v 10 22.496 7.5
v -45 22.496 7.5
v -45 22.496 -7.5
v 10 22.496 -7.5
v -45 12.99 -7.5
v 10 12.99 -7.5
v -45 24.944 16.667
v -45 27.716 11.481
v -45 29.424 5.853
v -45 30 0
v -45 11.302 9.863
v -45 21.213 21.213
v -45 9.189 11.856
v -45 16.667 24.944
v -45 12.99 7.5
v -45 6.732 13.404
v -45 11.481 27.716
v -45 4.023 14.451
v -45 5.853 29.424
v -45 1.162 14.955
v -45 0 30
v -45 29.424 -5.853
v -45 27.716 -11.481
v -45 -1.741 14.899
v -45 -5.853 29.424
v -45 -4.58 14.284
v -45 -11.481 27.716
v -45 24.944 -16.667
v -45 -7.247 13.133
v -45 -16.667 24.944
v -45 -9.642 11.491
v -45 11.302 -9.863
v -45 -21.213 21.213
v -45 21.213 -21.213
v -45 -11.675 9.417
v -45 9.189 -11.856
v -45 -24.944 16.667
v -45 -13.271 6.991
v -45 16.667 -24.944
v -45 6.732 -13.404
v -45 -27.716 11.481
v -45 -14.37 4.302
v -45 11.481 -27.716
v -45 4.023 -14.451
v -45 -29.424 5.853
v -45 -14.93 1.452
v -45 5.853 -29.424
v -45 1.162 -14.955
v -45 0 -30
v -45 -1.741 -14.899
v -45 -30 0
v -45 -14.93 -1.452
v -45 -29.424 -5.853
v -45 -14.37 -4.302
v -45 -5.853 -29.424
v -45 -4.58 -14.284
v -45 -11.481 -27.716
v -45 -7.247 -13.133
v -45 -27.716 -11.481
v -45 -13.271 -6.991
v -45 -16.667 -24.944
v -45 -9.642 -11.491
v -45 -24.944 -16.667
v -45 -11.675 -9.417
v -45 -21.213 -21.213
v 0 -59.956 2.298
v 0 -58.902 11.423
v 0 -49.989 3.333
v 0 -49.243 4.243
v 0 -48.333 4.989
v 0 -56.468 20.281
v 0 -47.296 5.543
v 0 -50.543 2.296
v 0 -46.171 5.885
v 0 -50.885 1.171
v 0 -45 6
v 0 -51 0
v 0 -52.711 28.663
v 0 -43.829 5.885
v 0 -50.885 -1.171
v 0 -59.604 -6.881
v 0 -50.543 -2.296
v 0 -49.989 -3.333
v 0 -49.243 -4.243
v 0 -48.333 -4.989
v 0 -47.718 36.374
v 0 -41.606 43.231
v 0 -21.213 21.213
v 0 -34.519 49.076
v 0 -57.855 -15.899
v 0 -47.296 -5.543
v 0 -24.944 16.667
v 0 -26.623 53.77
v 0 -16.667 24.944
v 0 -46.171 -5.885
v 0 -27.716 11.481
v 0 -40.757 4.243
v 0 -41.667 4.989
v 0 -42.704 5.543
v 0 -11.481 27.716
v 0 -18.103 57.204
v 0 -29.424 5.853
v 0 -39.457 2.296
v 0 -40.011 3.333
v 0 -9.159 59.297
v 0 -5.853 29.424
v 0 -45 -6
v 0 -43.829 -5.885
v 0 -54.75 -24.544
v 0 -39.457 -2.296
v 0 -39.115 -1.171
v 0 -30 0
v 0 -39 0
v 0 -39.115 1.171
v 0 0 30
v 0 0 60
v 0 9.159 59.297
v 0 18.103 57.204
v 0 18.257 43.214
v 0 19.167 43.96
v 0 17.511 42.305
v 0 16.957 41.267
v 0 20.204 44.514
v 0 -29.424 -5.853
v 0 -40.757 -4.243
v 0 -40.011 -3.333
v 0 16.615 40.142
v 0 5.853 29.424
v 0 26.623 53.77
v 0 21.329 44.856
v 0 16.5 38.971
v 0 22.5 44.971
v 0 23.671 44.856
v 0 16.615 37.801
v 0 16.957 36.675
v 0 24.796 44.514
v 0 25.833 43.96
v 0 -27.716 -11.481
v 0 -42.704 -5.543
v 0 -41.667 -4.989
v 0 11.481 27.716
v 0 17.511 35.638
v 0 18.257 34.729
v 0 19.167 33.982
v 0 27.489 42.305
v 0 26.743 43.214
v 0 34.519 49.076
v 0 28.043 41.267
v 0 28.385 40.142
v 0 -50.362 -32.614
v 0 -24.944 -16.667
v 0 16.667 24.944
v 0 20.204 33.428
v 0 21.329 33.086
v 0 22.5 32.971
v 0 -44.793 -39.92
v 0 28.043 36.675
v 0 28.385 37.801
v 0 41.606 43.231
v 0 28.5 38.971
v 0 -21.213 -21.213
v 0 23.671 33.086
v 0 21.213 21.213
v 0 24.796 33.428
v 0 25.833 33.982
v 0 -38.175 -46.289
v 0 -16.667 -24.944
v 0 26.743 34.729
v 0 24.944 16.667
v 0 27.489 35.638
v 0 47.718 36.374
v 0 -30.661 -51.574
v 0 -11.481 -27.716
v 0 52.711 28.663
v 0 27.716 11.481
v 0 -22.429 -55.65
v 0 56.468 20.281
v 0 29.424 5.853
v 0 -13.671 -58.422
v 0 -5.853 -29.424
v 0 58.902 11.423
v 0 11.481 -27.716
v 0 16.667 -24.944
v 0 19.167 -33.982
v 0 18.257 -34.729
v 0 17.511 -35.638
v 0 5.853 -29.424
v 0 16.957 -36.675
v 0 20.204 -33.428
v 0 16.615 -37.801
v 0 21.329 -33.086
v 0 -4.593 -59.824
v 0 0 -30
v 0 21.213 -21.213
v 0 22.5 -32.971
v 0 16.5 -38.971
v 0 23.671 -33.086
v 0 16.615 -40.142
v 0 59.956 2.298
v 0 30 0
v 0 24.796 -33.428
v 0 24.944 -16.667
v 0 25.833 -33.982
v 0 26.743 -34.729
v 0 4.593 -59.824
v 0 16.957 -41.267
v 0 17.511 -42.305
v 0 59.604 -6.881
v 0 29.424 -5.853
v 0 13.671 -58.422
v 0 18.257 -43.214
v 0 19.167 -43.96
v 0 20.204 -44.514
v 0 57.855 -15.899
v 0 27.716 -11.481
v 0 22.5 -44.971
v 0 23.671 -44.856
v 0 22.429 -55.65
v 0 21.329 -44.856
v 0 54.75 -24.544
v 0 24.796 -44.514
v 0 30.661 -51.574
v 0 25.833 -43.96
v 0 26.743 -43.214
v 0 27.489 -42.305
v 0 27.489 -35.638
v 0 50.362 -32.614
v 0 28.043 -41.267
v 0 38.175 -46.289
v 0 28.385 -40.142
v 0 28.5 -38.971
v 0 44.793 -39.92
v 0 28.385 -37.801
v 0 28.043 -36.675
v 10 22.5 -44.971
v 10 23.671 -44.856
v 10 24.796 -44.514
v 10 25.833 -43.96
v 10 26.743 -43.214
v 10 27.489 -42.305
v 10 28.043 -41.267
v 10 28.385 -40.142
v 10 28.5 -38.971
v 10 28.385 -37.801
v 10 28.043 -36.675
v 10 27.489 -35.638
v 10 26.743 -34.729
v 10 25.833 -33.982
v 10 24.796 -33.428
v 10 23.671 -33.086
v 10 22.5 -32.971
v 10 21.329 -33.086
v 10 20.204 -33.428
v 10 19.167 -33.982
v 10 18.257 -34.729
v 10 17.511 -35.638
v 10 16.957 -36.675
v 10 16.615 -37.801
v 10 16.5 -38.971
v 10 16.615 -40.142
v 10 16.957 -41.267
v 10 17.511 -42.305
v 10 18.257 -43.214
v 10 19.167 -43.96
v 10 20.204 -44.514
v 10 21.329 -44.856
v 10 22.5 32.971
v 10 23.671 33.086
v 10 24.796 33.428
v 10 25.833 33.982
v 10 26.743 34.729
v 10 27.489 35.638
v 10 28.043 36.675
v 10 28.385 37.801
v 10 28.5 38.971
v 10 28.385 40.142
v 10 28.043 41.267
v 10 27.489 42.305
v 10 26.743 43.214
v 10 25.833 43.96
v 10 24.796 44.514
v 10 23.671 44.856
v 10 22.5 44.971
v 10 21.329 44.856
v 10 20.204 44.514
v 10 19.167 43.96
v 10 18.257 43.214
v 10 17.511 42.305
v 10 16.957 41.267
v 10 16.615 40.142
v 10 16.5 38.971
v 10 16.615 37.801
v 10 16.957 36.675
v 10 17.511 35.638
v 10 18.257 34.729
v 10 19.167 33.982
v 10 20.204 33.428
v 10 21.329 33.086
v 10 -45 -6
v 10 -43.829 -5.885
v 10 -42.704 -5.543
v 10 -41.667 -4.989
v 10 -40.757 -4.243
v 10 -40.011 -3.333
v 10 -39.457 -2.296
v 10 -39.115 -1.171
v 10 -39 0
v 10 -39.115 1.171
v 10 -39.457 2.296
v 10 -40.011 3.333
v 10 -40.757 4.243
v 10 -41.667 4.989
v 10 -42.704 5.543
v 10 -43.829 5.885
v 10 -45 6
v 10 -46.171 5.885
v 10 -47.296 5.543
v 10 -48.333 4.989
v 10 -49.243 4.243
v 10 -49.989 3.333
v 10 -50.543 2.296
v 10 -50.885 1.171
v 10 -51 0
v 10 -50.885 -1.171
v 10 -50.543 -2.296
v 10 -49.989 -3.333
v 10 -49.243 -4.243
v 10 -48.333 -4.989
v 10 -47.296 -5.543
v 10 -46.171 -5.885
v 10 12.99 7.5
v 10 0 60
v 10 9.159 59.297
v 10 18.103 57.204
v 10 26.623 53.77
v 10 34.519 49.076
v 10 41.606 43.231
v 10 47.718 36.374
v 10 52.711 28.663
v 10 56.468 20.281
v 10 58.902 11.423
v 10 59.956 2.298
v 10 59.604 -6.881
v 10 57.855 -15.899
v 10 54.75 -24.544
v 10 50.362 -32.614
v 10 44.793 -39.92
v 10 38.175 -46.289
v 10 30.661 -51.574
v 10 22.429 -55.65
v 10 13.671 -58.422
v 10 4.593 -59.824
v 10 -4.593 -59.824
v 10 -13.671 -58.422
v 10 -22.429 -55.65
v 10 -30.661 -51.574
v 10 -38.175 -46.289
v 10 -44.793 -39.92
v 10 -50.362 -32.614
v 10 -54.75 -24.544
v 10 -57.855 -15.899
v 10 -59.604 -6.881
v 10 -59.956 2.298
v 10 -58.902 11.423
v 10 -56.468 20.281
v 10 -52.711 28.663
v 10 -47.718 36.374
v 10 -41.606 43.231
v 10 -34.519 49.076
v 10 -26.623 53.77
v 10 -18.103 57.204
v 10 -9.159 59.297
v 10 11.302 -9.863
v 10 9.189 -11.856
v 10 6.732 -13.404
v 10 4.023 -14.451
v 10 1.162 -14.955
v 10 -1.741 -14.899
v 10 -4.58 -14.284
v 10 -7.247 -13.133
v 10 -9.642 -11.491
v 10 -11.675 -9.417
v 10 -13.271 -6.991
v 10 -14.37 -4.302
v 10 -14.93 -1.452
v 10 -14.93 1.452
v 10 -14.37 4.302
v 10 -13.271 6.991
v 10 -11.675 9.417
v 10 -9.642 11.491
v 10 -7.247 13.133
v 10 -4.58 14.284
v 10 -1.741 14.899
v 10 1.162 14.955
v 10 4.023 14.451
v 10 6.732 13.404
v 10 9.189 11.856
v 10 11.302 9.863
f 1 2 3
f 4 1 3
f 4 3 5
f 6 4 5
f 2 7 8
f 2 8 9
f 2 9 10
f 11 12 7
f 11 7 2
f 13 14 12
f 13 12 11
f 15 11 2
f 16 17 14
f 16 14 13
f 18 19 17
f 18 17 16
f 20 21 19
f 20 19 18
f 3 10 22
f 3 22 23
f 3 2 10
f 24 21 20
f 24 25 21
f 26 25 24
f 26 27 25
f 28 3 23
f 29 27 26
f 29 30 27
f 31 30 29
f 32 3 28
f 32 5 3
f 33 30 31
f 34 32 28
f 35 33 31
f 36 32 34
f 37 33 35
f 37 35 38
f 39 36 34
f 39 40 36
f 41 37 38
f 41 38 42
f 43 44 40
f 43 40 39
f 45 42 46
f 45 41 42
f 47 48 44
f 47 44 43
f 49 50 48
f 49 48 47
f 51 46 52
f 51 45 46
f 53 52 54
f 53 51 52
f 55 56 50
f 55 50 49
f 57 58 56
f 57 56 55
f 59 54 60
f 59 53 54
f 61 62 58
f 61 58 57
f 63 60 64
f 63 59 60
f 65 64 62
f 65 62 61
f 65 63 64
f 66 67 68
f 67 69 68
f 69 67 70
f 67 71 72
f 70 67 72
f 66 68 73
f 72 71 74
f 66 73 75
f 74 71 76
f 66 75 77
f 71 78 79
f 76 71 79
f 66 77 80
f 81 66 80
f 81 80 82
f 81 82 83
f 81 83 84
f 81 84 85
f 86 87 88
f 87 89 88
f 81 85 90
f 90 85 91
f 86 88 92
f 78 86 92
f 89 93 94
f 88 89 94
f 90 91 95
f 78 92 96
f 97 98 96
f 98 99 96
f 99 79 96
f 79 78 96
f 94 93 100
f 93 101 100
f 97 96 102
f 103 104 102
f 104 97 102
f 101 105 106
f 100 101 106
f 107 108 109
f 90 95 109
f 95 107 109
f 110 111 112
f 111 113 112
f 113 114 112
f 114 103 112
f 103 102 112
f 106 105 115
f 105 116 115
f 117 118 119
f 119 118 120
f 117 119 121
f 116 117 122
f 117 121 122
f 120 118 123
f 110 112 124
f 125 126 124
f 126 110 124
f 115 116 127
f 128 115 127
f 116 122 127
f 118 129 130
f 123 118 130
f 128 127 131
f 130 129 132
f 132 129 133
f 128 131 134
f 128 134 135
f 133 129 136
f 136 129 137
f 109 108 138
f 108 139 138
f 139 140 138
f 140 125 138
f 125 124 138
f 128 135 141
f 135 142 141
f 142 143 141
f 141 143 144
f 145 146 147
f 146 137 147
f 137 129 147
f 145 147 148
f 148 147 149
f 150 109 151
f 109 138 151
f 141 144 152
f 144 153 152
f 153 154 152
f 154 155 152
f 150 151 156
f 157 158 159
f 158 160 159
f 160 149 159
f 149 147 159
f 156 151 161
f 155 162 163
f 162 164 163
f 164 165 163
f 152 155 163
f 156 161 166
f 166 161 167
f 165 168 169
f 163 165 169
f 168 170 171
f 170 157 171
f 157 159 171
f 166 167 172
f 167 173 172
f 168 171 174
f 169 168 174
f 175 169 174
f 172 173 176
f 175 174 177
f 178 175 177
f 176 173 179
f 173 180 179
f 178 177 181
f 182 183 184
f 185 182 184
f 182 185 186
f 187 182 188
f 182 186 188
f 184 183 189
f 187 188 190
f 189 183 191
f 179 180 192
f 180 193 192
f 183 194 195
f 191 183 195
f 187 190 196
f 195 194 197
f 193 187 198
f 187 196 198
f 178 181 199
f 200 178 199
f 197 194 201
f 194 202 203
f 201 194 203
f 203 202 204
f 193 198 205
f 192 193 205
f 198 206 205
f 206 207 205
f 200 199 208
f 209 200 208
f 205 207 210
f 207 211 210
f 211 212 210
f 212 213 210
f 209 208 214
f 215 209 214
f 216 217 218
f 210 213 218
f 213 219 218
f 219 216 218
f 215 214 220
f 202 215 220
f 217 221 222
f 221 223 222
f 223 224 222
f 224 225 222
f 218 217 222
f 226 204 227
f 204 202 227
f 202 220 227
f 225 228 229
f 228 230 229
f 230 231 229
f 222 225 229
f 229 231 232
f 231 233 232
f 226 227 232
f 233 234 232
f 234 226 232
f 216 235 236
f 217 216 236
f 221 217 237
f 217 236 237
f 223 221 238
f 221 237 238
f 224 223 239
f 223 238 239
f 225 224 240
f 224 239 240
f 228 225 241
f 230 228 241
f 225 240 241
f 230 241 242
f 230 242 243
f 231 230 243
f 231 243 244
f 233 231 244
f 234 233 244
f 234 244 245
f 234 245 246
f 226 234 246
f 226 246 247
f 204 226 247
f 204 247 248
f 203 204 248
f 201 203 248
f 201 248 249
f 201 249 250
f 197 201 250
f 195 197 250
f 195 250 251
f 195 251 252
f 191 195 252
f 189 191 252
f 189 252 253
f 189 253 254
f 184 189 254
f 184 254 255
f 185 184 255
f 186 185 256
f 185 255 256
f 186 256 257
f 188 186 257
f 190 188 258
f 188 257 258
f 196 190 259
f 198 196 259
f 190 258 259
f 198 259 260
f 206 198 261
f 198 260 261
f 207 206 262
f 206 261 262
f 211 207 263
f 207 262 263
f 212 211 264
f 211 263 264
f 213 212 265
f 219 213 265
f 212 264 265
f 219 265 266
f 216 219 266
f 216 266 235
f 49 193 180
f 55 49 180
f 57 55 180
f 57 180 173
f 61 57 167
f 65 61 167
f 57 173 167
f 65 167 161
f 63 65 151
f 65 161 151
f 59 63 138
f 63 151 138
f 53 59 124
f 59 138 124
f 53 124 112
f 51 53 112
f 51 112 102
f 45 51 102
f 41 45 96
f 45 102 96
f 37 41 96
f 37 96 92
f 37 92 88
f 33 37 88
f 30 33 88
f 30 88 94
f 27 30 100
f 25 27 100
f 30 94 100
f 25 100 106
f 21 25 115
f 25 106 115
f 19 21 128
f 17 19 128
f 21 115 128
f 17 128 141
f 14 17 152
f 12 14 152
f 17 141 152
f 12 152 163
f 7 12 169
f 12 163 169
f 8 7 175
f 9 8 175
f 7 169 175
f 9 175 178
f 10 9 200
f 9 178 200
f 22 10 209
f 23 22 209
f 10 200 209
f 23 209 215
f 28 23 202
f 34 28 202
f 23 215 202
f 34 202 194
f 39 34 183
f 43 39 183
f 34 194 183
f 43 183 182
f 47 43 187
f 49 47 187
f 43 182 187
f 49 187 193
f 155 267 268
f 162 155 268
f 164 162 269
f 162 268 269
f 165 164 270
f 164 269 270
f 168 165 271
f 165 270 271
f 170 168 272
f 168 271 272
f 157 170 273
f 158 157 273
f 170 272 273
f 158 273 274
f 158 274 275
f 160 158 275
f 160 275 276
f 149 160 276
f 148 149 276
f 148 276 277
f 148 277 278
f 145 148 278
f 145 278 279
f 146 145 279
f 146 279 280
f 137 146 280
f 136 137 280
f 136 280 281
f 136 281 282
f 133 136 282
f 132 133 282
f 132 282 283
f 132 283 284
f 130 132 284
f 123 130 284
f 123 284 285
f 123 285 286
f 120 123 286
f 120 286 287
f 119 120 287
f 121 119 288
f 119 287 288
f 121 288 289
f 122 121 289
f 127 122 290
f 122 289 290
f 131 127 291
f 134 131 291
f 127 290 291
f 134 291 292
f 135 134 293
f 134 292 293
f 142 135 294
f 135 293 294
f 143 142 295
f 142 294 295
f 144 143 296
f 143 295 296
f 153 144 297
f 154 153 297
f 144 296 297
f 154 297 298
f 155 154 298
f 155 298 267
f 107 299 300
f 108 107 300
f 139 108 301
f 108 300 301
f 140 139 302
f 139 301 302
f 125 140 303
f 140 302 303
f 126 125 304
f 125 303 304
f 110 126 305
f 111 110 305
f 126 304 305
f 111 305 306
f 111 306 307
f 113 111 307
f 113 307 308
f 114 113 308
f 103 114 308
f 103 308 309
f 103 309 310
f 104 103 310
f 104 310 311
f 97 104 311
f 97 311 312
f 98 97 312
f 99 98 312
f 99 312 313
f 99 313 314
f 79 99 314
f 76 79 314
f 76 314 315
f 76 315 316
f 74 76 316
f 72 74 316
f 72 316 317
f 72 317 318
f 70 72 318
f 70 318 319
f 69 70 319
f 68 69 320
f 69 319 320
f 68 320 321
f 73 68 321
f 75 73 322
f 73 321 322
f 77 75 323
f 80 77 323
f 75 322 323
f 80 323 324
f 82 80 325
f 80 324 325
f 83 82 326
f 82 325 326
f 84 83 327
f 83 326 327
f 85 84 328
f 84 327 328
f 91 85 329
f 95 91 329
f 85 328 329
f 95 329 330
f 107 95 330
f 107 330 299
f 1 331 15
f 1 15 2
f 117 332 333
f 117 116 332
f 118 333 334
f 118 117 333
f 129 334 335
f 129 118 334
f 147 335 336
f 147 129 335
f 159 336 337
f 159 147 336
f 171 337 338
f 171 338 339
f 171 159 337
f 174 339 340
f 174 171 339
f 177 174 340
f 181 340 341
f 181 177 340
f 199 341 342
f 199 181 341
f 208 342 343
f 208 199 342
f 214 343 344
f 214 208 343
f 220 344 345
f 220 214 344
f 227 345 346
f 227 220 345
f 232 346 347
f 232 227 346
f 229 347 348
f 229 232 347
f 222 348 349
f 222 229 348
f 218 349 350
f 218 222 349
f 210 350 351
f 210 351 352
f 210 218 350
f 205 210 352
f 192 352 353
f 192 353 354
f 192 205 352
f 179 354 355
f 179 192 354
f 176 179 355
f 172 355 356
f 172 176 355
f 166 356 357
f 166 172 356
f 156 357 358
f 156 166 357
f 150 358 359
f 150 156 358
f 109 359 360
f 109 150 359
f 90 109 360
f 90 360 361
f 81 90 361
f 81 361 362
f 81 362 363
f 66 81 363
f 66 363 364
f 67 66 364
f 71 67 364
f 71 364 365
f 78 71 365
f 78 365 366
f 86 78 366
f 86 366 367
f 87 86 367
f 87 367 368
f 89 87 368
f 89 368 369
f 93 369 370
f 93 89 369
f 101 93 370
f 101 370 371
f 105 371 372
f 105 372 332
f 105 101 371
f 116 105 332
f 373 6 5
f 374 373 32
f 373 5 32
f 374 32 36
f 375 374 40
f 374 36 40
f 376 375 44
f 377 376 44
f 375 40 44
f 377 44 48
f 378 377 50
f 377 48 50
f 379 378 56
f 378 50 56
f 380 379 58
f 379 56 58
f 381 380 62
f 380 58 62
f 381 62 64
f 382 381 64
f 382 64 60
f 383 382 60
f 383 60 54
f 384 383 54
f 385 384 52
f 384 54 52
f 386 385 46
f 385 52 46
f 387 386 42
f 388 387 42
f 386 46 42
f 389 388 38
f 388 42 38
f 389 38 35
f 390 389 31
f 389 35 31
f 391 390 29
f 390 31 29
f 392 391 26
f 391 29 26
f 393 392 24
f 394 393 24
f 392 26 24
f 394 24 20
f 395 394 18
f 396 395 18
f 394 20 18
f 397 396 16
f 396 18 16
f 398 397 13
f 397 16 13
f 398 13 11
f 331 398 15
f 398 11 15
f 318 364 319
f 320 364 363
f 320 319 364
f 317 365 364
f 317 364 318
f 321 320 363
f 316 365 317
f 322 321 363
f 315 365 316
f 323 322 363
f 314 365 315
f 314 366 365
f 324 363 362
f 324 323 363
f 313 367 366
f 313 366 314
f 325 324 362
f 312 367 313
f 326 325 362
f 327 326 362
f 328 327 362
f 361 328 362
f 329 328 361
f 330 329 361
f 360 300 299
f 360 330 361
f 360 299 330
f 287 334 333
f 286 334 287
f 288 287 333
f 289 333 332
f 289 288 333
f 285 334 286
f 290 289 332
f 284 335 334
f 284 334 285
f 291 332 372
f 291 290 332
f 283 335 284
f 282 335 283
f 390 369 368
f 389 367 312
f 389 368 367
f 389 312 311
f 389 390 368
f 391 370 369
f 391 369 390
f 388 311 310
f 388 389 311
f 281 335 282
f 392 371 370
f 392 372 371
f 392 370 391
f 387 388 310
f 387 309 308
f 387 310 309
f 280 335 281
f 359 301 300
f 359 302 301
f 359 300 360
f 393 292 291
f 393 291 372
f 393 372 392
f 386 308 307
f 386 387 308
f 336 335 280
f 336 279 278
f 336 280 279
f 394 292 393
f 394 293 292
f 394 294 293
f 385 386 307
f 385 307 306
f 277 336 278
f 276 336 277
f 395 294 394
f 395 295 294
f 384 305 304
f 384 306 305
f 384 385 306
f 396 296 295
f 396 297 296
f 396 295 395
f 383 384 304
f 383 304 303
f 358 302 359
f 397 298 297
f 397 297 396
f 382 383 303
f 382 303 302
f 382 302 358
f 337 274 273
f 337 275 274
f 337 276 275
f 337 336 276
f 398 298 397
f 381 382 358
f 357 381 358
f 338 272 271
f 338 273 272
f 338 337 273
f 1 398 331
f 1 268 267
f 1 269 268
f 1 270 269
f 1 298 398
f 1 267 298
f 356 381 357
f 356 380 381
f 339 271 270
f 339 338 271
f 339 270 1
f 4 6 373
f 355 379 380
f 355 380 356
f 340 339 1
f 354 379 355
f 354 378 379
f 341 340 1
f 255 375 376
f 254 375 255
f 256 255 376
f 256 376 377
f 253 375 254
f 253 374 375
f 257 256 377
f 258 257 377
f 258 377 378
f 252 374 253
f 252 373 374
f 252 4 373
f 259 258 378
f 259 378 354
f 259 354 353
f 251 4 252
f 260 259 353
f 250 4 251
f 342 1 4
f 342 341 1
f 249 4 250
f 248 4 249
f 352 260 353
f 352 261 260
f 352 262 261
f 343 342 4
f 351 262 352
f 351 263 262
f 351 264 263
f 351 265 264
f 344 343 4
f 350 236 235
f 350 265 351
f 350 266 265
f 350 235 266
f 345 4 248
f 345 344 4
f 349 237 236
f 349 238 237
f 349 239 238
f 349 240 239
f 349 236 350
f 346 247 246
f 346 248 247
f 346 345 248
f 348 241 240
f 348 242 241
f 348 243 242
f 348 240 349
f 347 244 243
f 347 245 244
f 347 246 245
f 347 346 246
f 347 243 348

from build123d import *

# Parameters (mm, degrees)
SKETCH1_W                  = 10
SKETCH1_H                  = 60
SKETCH2_R                  = 30
BOSS_EXTRUDE1_DEPTH        = 45
CUT_EXTRUDE1_DEPTH         = 102.118742081
SKETCH4_W                  = 55
SKETCH4_H                  = 15
F_12_0_12_DIAMETER_HOLE1_D = 12


with BuildPart() as part:
    # Sketch1 → Revolve1 (revolve)
    with BuildSketch(Plane(origin=(0, 0, 0), x_dir=(-1, 0, 0), z_dir=(0, 0, -1)), mode=Mode.PRIVATE) as revolve1_sk:
        with Locations((-5, 30)):
            Rectangle(SKETCH1_W, SKETCH1_H)
    revolve(revolve1_sk.sketch.rotate(Axis((10, 0, 0), (-1, 0, 0)), 270), axis=Axis((10, 0, 0), (-1, 0, 0)))

    # Sketch2 → Boss-Extrude1 (add)
    with BuildSketch(Plane.ZY):
        with Locations(Location((0, 0, 0), (0, 0, 180))):
            Circle(SKETCH2_R)
    extrude(amount=BOSS_EXTRUDE1_DEPTH)

    # Sketch3 → Cut-Extrude1 (cut, through all)
    with BuildSketch(Plane.ZY.offset(45)):
        with BuildLine():
            Line((-7.5, 22.495647676), (-7.5, 12.990381057))
            ThreePointArc((-7.5, 12.990381057), (0, 15), (7.5, 12.990381057))
            Line((7.5, 12.990381057), (7.5, 22.495647676))
            Line((7.5, 22.495647676), (-7.5, 22.495647676))
        make_face()
    extrude(amount=-CUT_EXTRUDE1_DEPTH, mode=Mode.SUBTRACT)

    # Sketch4 → Cut-Revolve1 (revolve, cut)
    with BuildSketch(Plane(origin=(0, 0, 0), x_dir=(-1, 0, 0), z_dir=(0, 0, -1))):
        with Locations((17.5, 7.5)):
            Rectangle(SKETCH4_W, SKETCH4_H)
    revolve(axis=Axis((10, 0, 0), (-1, 0, 0)), mode=Mode.SUBTRACT)

    # Ø12.0 (12) Diameter Hole1 (through all)
    with Locations(Plane.ZY):
        with Locations((-38.97114317, 22.5), (38.97114317, 22.5), (0, -45)):
            Hole(F_12_0_12_DIAMETER_HOLE1_D / 2)


solid = part.part
